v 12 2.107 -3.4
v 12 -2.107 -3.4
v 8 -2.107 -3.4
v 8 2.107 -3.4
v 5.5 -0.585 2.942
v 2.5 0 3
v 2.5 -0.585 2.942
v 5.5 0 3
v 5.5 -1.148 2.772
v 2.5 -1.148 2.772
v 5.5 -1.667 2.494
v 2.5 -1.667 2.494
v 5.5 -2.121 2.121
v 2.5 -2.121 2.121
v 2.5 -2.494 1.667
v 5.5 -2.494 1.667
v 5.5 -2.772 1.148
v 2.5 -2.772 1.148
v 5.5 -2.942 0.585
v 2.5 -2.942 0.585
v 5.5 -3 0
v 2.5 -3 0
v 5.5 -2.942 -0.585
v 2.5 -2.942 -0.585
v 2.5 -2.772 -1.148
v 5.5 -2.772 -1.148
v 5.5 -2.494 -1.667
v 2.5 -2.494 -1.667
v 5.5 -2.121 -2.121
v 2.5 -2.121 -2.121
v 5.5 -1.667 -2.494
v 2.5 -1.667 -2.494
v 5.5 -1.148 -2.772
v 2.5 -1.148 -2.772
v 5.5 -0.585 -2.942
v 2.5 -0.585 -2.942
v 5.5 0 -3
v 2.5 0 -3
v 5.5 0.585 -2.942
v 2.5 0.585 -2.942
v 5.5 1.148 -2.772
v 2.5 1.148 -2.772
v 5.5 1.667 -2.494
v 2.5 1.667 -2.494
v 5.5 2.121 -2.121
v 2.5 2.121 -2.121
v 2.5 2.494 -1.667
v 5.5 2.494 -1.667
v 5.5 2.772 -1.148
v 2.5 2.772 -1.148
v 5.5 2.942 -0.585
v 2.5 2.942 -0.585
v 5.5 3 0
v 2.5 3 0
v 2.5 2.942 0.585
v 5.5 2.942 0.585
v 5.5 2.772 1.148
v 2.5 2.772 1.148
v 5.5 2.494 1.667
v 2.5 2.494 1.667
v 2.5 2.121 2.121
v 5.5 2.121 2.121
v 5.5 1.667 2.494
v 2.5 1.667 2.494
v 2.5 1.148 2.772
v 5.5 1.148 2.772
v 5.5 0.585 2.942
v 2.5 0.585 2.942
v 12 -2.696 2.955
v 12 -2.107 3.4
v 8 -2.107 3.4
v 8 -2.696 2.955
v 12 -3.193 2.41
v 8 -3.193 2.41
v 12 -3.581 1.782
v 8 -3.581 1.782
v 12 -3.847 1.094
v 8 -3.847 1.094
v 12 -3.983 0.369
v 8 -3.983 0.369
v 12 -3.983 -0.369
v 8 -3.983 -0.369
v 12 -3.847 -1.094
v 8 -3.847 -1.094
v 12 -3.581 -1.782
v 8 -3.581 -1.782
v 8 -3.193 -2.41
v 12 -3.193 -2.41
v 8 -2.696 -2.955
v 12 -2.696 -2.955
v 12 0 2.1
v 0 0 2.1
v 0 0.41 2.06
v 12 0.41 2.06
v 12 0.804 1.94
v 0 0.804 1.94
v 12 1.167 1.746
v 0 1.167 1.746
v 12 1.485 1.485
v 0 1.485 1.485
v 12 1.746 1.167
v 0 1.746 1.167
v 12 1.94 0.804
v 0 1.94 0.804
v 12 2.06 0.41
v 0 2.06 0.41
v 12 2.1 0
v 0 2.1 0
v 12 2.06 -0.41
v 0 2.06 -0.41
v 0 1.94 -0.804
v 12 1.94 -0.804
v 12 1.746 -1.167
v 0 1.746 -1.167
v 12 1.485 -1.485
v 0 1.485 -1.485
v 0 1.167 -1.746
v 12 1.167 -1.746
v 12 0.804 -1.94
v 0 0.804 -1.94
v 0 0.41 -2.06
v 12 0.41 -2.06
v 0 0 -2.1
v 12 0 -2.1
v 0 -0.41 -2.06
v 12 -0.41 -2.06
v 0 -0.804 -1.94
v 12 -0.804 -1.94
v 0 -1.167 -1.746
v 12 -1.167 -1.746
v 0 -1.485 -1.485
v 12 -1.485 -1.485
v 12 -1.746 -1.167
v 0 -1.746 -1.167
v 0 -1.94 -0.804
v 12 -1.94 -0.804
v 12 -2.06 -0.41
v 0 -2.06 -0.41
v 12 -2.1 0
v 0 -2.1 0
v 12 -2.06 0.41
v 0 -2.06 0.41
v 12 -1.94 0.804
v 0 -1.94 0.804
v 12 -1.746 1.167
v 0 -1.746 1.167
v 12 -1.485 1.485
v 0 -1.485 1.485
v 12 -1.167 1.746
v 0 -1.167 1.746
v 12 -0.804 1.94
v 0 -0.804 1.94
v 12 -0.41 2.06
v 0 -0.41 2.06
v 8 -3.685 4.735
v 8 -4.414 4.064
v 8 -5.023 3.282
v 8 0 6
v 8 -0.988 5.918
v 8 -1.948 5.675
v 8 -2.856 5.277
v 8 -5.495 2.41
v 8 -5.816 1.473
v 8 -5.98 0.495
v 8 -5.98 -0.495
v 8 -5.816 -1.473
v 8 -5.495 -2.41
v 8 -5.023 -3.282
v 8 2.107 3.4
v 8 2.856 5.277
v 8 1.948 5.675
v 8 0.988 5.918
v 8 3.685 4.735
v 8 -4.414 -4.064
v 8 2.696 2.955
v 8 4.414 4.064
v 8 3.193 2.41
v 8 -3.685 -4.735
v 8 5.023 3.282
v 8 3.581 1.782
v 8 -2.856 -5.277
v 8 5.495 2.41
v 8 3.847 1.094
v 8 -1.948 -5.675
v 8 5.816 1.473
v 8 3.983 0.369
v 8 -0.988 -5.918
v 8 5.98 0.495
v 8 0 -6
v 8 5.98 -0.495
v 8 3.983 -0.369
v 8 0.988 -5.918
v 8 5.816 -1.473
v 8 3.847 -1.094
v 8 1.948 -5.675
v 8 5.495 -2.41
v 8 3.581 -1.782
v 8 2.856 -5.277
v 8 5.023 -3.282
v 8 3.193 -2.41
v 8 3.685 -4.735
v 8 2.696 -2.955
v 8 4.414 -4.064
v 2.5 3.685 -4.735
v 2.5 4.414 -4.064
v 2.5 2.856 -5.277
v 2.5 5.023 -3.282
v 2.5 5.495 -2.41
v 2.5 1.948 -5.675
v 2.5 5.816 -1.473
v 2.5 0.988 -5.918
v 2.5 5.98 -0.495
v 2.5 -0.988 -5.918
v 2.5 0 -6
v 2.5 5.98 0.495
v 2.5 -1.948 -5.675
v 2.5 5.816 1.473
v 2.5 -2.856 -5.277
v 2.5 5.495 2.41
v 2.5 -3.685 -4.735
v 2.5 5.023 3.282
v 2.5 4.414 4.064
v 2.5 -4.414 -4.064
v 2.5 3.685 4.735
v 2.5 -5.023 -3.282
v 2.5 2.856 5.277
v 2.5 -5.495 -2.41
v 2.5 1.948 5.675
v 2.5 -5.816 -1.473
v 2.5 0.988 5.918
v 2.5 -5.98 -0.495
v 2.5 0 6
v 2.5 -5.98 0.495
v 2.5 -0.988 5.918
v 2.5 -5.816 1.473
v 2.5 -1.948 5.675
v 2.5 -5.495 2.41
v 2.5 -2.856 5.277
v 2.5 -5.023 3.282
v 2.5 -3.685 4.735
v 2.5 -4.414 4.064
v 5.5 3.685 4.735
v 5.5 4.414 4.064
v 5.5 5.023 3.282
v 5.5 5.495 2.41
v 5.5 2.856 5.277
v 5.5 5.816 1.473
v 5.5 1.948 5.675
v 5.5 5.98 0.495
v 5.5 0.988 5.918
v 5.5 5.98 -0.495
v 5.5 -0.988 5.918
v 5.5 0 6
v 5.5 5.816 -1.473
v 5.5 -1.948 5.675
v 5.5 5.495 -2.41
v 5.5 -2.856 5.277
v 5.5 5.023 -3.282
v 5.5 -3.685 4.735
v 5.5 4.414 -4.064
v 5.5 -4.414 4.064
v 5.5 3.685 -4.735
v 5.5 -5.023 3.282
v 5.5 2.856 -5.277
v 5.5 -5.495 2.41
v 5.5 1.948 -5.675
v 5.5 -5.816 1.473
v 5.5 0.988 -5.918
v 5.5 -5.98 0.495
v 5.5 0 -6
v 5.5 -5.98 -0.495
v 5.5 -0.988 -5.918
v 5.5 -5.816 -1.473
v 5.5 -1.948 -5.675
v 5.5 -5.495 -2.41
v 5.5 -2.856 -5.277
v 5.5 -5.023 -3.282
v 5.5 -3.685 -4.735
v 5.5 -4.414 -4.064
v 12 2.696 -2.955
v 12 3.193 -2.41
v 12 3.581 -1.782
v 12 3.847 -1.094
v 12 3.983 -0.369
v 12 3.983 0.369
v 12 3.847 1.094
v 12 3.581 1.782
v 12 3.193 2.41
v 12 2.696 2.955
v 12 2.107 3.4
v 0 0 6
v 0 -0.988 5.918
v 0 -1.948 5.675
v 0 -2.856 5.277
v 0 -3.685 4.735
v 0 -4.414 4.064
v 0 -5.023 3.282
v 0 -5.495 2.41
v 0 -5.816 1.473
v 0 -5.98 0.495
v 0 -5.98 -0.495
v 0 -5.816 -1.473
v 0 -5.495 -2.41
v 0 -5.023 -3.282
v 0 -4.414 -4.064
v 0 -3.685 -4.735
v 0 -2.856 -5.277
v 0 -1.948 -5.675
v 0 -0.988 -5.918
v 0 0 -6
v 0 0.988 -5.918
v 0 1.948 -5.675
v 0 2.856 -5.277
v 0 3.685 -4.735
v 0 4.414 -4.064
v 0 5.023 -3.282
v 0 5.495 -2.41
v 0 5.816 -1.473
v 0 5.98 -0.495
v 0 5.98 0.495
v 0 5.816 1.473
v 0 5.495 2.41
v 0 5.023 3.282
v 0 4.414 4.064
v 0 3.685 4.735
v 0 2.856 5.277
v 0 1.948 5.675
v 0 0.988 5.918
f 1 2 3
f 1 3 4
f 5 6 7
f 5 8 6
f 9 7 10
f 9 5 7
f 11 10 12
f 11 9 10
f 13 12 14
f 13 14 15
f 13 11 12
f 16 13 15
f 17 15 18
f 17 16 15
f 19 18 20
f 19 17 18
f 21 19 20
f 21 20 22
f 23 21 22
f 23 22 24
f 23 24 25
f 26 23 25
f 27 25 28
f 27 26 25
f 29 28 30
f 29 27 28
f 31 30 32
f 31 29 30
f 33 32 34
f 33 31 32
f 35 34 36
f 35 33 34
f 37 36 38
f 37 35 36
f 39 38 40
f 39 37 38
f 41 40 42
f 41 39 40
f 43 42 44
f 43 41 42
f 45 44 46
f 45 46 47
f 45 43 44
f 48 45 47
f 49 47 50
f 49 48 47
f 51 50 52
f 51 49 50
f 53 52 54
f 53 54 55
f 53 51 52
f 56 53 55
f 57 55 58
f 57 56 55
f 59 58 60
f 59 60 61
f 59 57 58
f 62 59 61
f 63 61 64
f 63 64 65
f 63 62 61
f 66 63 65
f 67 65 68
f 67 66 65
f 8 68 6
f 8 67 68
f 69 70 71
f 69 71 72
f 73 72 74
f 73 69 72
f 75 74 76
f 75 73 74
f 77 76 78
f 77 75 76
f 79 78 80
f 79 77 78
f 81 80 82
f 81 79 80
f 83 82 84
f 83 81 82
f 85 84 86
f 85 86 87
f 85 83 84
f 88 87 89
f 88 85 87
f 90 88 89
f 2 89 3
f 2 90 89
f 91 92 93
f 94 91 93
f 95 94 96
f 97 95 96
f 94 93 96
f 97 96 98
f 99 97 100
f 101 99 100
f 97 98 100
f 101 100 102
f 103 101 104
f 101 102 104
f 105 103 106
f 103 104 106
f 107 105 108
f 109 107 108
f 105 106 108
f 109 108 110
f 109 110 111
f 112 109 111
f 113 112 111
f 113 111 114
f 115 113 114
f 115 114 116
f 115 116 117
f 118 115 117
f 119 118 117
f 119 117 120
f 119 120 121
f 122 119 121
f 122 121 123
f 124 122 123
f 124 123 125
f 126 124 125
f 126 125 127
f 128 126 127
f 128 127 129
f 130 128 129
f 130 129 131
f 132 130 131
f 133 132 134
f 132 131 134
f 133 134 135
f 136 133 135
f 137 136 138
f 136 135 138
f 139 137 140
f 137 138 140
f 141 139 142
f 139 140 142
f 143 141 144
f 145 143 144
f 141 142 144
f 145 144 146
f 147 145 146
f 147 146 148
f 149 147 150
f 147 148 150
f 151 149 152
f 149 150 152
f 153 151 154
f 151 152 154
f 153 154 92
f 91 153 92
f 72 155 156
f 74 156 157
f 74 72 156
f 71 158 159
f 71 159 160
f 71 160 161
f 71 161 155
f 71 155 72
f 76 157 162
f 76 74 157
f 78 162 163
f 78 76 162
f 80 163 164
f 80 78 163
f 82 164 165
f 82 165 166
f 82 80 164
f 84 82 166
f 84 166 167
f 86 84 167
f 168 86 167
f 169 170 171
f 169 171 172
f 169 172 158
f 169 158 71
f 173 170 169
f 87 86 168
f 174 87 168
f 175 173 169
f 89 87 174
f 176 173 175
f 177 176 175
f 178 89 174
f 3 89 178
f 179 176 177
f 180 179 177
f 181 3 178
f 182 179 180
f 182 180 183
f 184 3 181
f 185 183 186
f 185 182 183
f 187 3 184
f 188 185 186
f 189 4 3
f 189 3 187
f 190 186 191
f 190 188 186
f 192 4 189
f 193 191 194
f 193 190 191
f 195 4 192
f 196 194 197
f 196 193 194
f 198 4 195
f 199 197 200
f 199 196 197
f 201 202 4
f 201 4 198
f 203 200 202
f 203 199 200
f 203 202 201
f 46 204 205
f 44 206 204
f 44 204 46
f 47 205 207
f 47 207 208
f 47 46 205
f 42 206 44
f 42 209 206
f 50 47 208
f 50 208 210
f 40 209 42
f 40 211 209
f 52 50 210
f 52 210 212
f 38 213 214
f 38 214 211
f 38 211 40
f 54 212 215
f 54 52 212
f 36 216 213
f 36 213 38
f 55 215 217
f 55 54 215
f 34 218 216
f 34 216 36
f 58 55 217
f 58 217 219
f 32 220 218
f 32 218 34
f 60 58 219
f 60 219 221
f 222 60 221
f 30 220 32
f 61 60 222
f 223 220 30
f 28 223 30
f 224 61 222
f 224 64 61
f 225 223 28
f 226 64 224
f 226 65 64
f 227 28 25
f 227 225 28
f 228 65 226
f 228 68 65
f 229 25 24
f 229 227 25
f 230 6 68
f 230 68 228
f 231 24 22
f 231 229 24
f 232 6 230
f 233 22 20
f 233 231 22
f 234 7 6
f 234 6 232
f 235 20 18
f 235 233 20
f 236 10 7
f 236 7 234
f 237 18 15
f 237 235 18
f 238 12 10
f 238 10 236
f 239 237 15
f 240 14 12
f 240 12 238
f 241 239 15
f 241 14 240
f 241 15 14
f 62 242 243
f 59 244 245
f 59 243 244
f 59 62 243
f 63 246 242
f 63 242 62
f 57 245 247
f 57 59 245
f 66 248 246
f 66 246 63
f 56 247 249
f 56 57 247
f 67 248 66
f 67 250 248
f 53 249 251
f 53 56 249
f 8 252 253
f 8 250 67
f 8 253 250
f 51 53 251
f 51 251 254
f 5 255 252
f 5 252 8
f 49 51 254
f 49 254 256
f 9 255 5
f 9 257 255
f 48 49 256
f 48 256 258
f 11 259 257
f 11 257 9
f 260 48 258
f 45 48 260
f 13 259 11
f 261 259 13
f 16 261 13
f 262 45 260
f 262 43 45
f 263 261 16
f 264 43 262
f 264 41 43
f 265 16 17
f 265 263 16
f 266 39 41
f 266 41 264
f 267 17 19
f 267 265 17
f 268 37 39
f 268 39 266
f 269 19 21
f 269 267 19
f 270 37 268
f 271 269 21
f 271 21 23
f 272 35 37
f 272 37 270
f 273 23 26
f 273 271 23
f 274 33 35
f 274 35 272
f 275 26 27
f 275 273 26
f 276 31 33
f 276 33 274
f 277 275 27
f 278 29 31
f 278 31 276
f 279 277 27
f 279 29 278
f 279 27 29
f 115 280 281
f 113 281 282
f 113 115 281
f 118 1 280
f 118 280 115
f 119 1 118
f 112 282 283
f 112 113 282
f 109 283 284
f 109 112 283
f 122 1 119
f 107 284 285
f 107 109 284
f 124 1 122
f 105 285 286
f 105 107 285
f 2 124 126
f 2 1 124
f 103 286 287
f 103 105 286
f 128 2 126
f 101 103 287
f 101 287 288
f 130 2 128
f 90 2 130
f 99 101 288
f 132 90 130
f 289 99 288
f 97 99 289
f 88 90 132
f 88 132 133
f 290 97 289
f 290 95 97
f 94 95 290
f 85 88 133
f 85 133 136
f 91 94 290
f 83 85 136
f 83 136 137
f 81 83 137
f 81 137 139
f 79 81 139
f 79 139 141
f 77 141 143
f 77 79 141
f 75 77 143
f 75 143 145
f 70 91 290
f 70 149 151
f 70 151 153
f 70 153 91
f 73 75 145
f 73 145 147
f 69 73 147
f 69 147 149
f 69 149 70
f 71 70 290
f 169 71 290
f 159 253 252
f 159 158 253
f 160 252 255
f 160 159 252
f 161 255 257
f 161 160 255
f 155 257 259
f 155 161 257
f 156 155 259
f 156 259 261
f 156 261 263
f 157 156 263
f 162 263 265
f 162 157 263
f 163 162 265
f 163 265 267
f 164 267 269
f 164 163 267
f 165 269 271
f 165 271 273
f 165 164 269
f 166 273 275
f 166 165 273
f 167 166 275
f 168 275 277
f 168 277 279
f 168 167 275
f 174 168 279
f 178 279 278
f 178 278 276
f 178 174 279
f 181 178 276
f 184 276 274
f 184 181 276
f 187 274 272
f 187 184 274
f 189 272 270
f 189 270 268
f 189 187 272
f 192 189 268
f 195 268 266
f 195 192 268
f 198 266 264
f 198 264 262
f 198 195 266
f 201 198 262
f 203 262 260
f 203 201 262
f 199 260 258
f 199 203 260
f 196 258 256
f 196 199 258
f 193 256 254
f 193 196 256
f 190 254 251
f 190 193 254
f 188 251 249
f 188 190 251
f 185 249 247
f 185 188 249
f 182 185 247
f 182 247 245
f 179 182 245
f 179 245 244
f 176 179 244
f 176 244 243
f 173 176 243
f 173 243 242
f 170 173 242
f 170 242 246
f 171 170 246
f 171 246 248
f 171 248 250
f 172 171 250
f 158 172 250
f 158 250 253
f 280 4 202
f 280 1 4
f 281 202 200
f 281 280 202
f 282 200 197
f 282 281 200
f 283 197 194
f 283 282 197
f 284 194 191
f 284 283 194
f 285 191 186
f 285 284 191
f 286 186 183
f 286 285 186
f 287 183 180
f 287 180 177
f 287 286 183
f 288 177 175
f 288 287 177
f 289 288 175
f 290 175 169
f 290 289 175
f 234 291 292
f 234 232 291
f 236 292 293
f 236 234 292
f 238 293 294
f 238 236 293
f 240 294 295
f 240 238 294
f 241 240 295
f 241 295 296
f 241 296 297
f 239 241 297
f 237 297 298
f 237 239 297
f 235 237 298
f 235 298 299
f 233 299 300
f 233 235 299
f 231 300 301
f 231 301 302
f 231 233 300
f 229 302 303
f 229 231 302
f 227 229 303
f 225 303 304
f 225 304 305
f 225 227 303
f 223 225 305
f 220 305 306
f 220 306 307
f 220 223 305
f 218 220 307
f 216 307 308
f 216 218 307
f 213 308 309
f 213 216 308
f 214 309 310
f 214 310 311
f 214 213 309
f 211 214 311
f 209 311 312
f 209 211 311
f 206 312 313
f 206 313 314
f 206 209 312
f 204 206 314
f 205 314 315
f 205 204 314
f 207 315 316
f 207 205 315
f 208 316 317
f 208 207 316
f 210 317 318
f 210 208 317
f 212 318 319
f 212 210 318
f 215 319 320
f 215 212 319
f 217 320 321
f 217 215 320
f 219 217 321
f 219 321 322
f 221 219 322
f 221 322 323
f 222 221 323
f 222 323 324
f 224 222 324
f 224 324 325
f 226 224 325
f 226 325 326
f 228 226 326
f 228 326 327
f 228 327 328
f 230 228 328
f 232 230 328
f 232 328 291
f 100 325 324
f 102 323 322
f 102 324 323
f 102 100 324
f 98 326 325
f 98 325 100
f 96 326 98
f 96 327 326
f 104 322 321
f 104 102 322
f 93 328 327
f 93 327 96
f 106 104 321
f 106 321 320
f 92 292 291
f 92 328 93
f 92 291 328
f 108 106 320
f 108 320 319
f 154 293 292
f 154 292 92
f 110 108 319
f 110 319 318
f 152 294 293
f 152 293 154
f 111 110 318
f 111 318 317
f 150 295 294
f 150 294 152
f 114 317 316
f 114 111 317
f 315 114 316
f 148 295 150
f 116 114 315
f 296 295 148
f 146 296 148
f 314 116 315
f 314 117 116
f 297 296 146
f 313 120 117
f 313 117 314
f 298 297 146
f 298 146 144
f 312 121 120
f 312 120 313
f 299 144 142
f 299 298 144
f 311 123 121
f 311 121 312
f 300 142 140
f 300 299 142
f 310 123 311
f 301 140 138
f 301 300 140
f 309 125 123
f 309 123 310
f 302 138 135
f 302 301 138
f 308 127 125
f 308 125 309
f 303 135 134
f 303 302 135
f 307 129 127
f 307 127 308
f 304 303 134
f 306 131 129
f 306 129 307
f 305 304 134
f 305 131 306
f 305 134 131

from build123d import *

# Parameters (mm, degrees)
HOLE_WIZARD_M5_1_D  = 4.2
SKETCH_6_W          = 0.6
SKETCH_6_H          = 4.214261502
CUT_EXTRUDE_1_DEPTH = 4


with BuildPart() as part:
    # 草图1 → 旋转1 (revolve)
    with BuildSketch(Plane(origin=(0, 0, 0), x_dir=(1, 0, 0), z_dir=(0, 1, 0)), mode=Mode.PRIVATE) as revolve_1_sk:
        Polygon((0, 0), (0, 6), (2.5, 6), (2.5, 3), (5.5, 3), (5.5, 6), (8, 6), (8, 4), (12, 4), (12, 0), align=None)
    revolve(revolve_1_sk.sketch.rotate(Axis((-1000, 0, 0), (1, 0, 0)), 180), axis=Axis((-1000, 0, 0), (1, 0, 0)))

    # M5 螺纹孔1 (through all)
    with Locations(Plane(origin=(12, 0, 0), x_dir=(0, 0, -1), z_dir=(1, 0, 0))):
        with Locations((0, 0)):
            Hole(HOLE_WIZARD_M5_1_D / 2)

    # 草图6 → 切除-拉伸1 (cut)
    with BuildSketch(Plane(origin=(12, 0, 0), x_dir=(0, 0, -1), z_dir=(1, 0, 0))):
        with Locations((-3.7, 0)):
            Rectangle(SKETCH_6_W, SKETCH_6_H)
        with Locations((3.7, 0)):
            Rectangle(SKETCH_6_W, SKETCH_6_H)
    extrude(amount=-CUT_EXTRUDE_1_DEPTH, mode=Mode.SUBTRACT)


solid = part.part
